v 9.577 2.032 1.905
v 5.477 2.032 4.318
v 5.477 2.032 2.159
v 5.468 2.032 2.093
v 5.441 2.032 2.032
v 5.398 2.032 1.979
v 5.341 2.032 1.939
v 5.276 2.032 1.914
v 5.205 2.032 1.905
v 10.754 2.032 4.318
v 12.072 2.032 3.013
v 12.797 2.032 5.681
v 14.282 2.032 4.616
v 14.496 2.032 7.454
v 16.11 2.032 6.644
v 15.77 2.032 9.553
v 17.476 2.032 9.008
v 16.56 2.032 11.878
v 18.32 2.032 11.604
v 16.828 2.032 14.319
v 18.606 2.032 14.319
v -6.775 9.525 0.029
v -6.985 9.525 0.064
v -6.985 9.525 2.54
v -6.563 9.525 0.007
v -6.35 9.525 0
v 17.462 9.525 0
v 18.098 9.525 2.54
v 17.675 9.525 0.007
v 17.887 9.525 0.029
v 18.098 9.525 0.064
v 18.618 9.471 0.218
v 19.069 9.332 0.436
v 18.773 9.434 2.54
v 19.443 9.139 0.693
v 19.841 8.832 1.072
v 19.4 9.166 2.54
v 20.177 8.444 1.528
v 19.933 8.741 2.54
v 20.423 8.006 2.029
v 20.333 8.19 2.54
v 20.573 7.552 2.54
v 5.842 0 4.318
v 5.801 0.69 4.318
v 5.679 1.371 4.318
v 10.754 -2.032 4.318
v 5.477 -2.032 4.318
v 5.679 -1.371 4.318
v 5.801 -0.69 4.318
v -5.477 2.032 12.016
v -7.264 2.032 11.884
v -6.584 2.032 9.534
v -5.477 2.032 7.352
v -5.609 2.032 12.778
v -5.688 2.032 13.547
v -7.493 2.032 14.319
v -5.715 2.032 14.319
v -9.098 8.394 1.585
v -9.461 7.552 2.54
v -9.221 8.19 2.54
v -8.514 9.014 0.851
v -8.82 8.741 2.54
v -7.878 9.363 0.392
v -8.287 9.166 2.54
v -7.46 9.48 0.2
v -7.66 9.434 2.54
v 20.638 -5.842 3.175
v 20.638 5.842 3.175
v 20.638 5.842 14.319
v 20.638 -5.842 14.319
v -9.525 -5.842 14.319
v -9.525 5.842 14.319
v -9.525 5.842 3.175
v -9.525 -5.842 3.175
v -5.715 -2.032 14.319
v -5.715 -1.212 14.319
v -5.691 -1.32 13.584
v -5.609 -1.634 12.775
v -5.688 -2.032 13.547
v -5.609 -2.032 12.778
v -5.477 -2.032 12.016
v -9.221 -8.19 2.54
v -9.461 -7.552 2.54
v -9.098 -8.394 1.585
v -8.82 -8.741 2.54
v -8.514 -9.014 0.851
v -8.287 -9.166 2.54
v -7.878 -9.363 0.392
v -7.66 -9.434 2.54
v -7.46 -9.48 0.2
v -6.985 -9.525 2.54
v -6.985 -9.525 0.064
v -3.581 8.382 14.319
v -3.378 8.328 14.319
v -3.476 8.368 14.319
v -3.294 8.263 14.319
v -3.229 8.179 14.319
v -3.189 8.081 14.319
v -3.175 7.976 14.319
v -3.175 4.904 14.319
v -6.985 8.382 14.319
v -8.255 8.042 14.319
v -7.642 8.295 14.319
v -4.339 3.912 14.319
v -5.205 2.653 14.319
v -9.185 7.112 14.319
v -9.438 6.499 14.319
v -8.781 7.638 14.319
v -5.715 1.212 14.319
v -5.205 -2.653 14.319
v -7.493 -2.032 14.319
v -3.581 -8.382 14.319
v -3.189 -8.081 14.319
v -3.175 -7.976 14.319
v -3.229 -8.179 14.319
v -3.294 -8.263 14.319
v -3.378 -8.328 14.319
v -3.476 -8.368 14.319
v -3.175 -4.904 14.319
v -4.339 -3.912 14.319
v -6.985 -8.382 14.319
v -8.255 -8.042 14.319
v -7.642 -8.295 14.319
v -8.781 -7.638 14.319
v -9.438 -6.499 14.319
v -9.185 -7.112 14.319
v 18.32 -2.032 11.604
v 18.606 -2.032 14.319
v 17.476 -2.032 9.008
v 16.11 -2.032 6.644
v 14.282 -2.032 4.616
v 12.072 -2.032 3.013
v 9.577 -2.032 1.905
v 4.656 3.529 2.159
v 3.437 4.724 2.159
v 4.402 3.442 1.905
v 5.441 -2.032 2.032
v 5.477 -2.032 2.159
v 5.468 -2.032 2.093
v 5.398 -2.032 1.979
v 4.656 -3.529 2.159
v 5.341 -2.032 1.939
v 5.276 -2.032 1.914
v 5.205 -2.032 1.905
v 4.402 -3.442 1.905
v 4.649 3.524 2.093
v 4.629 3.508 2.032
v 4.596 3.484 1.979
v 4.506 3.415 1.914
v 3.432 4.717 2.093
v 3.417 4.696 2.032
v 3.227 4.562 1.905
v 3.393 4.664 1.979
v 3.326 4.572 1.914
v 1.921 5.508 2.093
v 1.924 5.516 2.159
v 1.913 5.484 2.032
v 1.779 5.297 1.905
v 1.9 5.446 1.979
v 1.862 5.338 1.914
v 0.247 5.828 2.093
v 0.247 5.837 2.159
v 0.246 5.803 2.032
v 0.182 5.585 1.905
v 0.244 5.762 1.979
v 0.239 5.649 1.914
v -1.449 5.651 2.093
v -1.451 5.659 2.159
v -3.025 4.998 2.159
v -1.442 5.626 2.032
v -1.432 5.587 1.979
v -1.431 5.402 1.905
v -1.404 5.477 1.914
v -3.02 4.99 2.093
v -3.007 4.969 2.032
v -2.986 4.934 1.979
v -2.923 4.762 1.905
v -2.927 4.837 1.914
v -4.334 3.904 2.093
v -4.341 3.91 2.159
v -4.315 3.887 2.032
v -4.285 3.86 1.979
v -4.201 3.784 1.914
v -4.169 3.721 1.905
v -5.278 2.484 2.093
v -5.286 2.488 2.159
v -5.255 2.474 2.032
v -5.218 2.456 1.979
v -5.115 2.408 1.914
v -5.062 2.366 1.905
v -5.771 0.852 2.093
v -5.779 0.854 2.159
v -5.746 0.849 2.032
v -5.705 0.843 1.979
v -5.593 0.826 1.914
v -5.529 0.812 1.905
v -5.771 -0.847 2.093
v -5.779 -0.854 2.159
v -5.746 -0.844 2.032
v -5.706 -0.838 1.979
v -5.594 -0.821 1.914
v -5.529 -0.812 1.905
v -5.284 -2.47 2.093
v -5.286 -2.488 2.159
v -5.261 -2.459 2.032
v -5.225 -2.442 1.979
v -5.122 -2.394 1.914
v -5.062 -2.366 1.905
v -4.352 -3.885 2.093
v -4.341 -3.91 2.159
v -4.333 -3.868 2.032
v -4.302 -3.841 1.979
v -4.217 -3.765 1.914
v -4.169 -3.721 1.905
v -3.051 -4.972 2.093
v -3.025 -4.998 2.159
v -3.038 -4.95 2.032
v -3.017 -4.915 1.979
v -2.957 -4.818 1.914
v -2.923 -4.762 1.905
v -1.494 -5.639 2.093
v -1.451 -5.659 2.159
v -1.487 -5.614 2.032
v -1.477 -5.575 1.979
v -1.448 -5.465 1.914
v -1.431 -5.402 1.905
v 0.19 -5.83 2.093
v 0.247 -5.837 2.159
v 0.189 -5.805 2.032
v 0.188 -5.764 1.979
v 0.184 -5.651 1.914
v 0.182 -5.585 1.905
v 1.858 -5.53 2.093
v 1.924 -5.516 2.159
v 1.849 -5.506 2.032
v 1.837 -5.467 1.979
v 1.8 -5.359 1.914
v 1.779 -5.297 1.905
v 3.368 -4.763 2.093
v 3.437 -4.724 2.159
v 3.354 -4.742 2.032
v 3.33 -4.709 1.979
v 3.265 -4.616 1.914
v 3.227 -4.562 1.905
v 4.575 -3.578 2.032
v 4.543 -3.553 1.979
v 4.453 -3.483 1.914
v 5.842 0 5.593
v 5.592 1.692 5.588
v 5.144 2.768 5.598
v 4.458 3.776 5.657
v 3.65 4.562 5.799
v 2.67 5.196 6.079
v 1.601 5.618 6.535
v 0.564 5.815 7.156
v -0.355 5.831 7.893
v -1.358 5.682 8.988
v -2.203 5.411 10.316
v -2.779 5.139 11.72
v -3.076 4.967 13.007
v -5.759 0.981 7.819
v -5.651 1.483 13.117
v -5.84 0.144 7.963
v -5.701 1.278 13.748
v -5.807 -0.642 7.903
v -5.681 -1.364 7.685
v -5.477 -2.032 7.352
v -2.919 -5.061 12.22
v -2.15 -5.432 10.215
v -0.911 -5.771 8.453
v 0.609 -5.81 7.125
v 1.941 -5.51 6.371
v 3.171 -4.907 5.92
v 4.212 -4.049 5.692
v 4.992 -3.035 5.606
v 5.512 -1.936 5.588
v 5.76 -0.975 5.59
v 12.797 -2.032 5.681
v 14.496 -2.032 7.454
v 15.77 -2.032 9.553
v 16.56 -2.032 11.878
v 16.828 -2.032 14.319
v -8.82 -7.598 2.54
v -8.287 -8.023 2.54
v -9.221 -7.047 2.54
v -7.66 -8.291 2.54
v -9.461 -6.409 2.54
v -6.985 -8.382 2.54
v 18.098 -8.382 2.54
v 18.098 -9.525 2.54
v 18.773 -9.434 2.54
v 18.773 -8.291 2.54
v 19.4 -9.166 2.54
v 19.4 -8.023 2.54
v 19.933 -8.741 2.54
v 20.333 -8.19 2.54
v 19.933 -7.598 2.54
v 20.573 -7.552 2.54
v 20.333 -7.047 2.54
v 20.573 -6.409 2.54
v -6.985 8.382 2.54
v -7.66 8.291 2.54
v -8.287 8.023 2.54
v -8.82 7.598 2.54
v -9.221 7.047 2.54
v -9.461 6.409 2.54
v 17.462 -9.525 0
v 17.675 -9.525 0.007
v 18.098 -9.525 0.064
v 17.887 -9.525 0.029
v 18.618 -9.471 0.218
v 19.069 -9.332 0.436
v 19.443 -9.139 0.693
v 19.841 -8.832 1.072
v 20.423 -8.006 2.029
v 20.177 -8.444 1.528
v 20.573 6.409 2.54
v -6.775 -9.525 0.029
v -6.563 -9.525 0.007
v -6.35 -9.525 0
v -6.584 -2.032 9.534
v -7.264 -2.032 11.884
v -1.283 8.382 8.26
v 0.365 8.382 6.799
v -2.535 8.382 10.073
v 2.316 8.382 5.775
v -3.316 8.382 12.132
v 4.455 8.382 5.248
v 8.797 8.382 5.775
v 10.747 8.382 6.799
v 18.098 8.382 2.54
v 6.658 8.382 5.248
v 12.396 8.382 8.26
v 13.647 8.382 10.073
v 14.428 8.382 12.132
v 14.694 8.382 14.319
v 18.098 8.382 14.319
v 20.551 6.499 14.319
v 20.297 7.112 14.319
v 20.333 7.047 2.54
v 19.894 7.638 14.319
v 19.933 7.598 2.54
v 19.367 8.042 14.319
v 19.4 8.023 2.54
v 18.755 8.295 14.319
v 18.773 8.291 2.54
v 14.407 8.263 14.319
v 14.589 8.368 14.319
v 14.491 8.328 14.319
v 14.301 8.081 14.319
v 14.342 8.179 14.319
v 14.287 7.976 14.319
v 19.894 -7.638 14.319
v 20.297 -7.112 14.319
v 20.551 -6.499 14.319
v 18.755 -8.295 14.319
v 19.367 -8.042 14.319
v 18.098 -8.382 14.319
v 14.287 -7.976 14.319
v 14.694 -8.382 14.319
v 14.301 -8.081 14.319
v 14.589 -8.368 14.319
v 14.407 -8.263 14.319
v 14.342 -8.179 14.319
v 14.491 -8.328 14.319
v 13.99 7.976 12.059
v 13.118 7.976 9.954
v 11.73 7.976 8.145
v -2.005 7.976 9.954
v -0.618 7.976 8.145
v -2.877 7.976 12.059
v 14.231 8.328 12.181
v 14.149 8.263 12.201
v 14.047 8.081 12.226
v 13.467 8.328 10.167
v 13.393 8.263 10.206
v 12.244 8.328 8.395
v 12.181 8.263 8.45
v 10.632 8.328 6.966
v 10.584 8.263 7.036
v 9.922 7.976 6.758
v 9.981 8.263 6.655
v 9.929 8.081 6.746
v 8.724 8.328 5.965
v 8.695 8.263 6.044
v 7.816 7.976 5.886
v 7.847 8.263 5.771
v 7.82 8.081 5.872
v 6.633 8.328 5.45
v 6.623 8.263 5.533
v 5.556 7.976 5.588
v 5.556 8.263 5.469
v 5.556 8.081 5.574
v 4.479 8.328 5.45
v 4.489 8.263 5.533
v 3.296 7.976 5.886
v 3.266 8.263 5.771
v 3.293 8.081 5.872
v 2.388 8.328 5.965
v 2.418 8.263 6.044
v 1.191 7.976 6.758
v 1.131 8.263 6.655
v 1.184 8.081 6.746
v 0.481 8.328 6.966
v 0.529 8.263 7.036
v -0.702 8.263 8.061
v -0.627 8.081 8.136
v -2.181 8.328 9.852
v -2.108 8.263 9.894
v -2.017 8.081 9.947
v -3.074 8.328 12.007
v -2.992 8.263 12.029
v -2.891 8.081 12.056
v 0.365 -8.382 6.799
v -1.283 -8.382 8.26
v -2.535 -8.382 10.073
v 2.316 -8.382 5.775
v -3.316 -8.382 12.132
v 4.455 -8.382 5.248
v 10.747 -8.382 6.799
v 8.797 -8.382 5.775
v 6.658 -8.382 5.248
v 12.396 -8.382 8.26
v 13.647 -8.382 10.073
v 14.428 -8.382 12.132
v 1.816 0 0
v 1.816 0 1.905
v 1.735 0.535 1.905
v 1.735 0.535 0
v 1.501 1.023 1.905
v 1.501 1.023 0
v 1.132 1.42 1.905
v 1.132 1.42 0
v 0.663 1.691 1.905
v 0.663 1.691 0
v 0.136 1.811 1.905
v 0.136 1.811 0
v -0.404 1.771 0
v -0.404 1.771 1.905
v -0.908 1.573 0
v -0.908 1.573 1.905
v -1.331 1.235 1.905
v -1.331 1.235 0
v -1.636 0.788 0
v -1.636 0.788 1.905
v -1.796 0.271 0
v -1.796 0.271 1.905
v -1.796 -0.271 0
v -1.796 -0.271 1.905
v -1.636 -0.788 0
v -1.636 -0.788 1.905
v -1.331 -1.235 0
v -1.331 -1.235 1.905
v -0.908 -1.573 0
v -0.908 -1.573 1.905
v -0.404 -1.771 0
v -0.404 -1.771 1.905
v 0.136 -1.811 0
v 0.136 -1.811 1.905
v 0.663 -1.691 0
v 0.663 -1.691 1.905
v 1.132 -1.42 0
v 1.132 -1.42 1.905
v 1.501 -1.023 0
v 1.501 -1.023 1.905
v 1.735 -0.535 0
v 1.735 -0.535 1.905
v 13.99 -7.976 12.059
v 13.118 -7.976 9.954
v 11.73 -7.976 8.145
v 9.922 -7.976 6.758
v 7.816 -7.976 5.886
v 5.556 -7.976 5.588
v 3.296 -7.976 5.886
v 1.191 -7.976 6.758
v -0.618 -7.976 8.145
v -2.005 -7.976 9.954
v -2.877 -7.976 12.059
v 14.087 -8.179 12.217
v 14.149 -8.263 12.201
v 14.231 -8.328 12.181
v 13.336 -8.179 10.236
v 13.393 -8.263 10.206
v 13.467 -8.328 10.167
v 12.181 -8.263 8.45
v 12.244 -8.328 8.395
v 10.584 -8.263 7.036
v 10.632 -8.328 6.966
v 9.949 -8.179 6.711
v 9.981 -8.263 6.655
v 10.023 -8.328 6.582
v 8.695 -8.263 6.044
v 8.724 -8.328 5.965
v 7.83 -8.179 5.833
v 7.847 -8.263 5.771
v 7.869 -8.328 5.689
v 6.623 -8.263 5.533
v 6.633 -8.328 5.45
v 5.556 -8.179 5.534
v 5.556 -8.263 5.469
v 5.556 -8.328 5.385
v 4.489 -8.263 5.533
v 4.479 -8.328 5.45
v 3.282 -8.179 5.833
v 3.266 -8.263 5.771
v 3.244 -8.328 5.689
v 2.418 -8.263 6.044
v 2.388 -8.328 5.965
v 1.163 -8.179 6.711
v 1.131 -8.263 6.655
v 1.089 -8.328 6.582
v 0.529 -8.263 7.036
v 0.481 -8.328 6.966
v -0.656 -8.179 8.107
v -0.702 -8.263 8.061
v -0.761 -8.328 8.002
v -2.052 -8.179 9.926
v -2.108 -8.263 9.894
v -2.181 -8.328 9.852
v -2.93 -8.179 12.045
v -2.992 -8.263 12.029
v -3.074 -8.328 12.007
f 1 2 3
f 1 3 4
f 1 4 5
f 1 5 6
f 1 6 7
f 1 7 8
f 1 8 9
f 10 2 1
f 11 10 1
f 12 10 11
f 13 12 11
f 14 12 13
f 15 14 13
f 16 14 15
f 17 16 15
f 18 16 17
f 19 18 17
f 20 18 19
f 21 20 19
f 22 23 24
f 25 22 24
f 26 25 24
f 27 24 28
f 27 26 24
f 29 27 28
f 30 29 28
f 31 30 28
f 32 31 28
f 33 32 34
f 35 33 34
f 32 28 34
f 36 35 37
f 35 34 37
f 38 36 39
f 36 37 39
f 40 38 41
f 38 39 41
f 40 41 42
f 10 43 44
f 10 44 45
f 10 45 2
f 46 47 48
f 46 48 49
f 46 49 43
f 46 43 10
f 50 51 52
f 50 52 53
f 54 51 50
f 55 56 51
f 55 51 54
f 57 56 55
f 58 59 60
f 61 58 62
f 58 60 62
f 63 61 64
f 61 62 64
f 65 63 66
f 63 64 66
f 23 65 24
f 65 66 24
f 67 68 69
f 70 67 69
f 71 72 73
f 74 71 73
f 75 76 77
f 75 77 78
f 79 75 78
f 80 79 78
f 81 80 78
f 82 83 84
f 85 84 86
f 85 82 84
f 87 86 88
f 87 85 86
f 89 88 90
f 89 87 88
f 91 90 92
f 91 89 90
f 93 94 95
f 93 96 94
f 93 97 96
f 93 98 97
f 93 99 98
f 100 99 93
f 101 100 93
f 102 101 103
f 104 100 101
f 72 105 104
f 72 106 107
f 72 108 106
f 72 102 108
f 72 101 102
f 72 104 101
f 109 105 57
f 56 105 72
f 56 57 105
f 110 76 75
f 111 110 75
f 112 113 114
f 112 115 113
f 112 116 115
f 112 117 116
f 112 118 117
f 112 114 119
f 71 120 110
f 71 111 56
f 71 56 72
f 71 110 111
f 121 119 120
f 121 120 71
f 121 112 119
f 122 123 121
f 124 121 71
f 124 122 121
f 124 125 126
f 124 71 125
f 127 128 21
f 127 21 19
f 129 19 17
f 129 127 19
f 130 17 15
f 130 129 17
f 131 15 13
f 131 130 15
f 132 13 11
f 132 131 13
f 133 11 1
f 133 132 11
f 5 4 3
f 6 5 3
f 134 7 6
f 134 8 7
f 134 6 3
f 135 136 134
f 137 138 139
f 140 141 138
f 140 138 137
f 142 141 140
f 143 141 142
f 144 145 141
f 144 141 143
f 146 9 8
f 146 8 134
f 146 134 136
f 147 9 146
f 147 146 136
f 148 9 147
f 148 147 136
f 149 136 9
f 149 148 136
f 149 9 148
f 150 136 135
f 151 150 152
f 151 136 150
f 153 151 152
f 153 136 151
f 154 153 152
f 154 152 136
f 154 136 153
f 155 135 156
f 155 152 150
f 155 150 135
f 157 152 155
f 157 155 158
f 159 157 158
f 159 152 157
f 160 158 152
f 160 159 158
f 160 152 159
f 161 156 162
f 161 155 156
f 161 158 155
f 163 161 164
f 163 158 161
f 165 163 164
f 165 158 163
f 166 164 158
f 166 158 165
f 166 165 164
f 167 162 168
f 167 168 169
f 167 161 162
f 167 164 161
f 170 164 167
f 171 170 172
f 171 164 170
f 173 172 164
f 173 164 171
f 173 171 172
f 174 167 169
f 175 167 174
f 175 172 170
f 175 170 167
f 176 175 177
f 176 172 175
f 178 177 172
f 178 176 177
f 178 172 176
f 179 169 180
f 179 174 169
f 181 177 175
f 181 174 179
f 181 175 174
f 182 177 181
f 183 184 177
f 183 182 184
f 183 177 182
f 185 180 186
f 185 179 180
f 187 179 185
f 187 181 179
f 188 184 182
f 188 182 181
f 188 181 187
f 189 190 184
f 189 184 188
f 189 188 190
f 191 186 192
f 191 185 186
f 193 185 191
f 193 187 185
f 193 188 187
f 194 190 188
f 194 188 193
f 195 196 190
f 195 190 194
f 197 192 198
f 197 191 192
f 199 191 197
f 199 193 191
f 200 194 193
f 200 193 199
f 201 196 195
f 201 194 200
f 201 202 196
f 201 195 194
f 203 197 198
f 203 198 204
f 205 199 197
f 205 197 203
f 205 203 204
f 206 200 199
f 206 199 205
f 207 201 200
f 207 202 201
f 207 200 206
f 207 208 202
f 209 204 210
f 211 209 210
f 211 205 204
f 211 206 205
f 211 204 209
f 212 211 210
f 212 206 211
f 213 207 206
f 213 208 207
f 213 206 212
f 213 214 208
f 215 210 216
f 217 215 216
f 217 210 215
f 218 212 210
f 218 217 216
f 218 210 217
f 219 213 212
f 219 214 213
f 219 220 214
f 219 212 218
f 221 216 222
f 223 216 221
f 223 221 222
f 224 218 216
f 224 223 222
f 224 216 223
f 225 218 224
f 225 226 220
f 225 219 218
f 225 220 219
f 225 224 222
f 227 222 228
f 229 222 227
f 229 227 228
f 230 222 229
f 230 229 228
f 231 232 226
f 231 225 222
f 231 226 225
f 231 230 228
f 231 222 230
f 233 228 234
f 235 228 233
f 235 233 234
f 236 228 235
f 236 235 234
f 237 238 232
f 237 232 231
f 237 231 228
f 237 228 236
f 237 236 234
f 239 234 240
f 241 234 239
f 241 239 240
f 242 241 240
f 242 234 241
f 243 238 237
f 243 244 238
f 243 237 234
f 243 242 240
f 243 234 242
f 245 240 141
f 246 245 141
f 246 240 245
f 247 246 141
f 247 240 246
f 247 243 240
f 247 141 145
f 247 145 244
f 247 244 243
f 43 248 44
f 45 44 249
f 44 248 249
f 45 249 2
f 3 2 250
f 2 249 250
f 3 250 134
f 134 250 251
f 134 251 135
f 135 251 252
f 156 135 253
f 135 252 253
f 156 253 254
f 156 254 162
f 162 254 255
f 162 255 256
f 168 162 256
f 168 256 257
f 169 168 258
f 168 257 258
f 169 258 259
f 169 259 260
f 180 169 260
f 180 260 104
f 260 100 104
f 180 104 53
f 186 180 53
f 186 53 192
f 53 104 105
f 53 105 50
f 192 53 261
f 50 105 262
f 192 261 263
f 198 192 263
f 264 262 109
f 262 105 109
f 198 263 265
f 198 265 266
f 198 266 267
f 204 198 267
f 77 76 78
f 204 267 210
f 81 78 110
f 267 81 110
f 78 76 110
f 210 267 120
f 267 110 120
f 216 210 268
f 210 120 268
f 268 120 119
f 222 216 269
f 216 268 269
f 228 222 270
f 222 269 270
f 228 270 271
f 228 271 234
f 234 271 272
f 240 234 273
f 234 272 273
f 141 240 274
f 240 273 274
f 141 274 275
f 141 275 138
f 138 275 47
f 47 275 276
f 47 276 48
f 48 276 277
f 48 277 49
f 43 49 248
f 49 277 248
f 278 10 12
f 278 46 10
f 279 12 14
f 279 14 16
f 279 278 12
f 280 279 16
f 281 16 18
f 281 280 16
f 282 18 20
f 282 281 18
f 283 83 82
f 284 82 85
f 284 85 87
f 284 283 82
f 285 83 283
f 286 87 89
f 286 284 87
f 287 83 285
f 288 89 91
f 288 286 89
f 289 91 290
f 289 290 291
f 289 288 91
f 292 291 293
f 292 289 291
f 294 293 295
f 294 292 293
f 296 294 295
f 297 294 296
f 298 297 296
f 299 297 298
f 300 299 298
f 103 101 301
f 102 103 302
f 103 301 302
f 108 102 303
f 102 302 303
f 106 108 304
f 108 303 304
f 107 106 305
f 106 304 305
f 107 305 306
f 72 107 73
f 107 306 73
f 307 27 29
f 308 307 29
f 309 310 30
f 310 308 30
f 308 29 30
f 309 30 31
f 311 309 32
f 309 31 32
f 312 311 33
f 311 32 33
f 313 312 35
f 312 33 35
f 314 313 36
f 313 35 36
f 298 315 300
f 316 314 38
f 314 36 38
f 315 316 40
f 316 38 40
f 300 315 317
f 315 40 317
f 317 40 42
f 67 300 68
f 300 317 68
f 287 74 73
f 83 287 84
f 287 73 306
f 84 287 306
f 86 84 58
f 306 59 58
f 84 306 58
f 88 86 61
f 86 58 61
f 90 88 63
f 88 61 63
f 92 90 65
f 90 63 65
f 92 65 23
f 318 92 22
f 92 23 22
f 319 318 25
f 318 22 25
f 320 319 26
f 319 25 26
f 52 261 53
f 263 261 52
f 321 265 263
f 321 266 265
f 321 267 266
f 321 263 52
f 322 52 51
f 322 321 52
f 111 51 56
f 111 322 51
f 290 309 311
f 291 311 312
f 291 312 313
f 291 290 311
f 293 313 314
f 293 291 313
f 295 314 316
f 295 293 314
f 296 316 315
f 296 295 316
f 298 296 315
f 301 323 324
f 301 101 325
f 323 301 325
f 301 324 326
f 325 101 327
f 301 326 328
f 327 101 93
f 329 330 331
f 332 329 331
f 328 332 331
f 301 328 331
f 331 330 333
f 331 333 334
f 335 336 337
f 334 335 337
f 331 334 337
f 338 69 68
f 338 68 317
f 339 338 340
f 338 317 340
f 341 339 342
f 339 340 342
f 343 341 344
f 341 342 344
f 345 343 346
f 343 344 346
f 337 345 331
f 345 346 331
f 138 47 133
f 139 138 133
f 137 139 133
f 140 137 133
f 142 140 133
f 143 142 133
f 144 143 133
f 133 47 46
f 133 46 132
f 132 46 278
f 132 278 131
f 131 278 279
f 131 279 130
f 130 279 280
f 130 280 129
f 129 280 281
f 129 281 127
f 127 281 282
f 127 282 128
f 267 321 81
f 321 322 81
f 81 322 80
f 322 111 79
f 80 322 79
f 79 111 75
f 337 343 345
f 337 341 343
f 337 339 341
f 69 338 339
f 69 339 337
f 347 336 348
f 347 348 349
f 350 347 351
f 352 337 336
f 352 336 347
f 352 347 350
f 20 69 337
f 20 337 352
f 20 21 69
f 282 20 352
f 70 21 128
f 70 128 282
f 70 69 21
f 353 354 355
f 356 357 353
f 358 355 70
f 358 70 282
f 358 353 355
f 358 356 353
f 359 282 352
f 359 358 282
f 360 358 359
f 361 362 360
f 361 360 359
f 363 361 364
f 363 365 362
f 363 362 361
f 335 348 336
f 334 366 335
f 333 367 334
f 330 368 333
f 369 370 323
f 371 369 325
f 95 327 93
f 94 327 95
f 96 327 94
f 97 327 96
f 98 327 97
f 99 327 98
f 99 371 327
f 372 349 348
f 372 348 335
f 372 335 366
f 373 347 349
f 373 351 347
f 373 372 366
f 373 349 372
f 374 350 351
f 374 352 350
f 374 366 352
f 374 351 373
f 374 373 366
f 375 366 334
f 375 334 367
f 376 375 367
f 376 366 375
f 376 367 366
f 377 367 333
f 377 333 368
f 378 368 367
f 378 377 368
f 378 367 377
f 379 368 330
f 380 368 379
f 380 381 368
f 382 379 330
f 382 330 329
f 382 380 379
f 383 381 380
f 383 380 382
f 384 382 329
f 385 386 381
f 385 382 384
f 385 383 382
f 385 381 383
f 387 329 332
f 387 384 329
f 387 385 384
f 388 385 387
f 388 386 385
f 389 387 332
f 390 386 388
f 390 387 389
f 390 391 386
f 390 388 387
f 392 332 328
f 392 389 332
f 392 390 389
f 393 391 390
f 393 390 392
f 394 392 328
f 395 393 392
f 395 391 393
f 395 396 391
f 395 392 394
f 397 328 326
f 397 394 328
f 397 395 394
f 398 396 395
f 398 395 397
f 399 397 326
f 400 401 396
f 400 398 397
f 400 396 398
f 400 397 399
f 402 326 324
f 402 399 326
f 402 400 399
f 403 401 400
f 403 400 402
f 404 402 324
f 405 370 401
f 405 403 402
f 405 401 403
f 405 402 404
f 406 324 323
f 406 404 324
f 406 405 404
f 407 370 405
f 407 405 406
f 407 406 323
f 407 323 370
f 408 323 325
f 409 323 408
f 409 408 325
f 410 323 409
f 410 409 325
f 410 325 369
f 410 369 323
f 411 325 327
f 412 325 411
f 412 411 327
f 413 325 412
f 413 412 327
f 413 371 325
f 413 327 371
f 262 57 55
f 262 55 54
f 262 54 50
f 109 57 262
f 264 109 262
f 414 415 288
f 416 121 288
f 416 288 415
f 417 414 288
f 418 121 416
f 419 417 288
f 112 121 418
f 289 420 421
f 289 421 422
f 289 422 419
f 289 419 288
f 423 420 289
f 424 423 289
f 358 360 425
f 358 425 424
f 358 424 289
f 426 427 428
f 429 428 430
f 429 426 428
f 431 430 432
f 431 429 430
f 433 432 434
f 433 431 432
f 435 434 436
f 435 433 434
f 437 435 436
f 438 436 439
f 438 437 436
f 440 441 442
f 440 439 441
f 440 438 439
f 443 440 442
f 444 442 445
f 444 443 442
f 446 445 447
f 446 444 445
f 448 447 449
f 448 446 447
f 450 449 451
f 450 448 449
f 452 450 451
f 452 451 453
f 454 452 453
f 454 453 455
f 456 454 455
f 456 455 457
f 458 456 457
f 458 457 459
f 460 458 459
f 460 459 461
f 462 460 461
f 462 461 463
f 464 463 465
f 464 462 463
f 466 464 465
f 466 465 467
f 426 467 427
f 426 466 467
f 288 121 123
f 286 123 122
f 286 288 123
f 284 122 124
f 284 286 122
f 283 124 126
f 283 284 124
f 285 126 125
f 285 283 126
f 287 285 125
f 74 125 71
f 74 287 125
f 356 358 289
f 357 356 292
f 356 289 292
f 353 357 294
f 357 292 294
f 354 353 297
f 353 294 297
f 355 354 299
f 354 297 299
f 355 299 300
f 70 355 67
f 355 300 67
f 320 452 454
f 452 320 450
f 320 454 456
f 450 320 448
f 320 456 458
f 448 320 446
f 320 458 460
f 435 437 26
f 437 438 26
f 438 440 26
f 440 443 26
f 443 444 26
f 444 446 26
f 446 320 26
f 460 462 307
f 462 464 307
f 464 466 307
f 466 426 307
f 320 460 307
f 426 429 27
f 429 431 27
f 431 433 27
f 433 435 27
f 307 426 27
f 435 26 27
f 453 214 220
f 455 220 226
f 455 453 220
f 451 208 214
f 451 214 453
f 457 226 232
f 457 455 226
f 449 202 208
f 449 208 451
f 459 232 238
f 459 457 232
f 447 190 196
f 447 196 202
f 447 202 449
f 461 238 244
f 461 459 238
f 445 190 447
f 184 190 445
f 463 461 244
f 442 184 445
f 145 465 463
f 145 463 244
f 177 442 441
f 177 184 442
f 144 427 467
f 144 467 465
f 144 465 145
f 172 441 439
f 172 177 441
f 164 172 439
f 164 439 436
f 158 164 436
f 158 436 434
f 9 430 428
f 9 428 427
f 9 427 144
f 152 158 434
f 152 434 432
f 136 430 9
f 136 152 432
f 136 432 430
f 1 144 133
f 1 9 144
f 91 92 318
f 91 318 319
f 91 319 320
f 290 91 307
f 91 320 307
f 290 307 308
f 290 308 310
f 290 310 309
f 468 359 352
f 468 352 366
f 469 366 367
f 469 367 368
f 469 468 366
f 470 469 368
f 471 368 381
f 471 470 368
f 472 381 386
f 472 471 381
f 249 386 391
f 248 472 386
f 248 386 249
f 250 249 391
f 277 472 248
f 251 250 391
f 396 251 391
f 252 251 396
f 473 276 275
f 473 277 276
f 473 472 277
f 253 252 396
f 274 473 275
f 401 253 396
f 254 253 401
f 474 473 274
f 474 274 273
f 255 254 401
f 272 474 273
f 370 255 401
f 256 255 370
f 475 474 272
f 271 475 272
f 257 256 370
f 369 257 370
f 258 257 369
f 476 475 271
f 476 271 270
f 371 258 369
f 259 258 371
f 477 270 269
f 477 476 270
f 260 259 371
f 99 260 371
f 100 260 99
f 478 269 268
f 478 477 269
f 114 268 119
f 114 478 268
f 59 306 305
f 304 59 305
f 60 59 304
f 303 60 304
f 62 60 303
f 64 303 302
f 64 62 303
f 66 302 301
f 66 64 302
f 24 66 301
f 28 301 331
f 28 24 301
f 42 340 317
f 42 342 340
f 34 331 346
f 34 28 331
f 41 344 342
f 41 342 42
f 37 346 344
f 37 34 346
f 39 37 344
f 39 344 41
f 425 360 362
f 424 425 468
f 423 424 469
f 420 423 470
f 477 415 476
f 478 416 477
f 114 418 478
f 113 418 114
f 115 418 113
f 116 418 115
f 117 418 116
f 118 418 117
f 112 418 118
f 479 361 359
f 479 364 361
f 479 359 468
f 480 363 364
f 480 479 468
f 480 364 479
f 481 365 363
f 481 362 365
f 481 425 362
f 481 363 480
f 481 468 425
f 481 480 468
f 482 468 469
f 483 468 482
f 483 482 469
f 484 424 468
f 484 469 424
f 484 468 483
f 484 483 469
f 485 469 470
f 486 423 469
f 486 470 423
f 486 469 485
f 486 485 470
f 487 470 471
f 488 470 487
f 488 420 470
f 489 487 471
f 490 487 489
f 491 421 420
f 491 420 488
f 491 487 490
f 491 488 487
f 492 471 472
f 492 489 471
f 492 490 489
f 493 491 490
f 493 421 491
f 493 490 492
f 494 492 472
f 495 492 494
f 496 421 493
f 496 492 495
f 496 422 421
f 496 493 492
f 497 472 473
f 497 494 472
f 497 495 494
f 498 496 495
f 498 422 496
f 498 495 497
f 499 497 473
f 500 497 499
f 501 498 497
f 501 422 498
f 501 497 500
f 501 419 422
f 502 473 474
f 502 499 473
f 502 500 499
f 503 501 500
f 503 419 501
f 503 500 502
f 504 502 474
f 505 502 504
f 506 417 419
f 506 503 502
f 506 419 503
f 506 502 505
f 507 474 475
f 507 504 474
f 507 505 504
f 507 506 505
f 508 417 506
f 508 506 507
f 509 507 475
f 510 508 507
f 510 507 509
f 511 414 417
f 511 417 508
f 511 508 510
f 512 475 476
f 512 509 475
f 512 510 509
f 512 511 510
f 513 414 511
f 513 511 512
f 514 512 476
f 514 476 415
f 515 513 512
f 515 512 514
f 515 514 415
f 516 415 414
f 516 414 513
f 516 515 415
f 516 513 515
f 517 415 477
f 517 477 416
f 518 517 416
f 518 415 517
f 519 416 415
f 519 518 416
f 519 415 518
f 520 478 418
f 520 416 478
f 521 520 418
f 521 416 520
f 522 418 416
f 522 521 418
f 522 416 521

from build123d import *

# Parameters (mm, degrees)
F2_W         = 30.1625
F2_H         = 19.05
F2_R         = 5.842
F2_R_2       = 1.8161
F3_DEPTH     = 2.54
F5_DEPTH     = 2.032
F7_DEPTH     = 6.35
F8_DEPTH     = 2.032
F9_DEPTH     = 2.032
F11_DEPTH    = 14.32025
F12_R        = 5.842
F13_DEPTH    = 12.41425
F14_R        = 2.54
F15_R        = 0.4064
F16_R        = 0.254
F17_T1_DEPTH = 18.2149387894
F18_T1_DEPTH = 29.845


# Not quite as in the source:
# - a fillet or chamfer that OpenCascade refuses, or shapes differently, is made with other operations: its cross-section is extruded or revolved along the edge and cut away or added


with BuildPart() as f3:
    # F2 (on Top) → F3 (new body)
    with BuildSketch(Plane.XY):
        with Locations((5.55625, 0)):
            Rectangle(F2_W, F2_H)
        Circle(F2_R, mode=Mode.SUBTRACT)
        Circle(F2_R)
        Circle(F2_R_2, mode=Mode.SUBTRACT)
    extrude(amount=F3_DEPTH)

    # F4 (on Front) → F5 (join, symmetric)
    with BuildSketch(Plane.XZ):
        with BuildLine():
            ThreePointArc((1.5351403895, 1.905), (-4.9973131459, 6.6442757011), (-7.493, 14.31925))
            Line((-7.493, 14.31925), (-9.525, 14.31925))
            Line((-9.525, 14.31925), (-9.525, 0))
            Line((-9.525, 0), (20.6375, 0))
            Line((20.6375, 0), (20.6375, 14.31925))
            Line((20.6375, 14.31925), (18.6055, 14.31925))
            ThreePointArc((18.6055, 14.31925), (16.1098131459, 6.6442757011), (9.5773596105, 1.905))
            Line((9.5773596105, 1.905), (1.5351403895, 1.905))
        make_face()
    extrude(amount=F5_DEPTH, both=True)

    # F6 (on face) → F7 (join)
    with BuildSketch(Plane.XZ.offset(2.032)):
        with BuildLine():
            Line((-3.175, 14.31925), (-9.525, 14.31925))
            Line((-9.525, 14.31925), (-9.525, 0))
            Line((-9.525, 0), (20.6375, 0))
            Line((20.6375, 0), (20.6375, 14.31925))
            Line((20.6375, 14.31925), (14.2875, 14.31925))
            ThreePointArc((14.2875, 14.31925), (5.55625, 5.588), (-3.175, 14.31925))
        make_face()
    extrude(amount=F7_DEPTH)

    # F4 (on Front) → F8 (cut, symmetric)
    with BuildSketch(Plane.XZ):
        with BuildLine():
            ThreePointArc((0.3585509899, 4.318), (-4.0776910817, 8.4687580722), (-5.715, 14.31925))
            Line((-5.715, 14.31925), (-7.493, 14.31925))
            ThreePointArc((-7.493, 14.31925), (-4.9973131459, 6.6442757011), (1.5351403895, 1.905))
            Line((1.5351403895, 1.905), (9.5773596105, 1.905))
            ThreePointArc((9.5773596105, 1.905), (16.1098131459, 6.6442757011), (18.6055, 14.31925))
            Line((18.6055, 14.31925), (16.8275, 14.31925))
            ThreePointArc((16.8275, 14.31925), (15.1901910817, 8.4687580722), (10.7539490101, 4.318))
            Line((10.7539490101, 4.318), (0.3585509899, 4.318))
        make_face()
    extrude(amount=F8_DEPTH, both=True, mode=Mode.SUBTRACT)

    # F4 (on Front) → F9 (join, through all)
    with BuildSketch(Plane.XZ):
        with BuildLine():
            ThreePointArc((14.2875, 14.31925), (5.55625, 5.588), (-3.175, 14.31925))
            Line((-3.175, 14.31925), (-5.715, 14.31925))
            ThreePointArc((-5.715, 14.31925), (-4.0776910817, 8.4687580722), (0.3585509899, 4.318))
            Line((0.3585509899, 4.318), (10.7539490101, 4.318))
            ThreePointArc((10.7539490101, 4.318), (15.1901910817, 8.4687580722), (16.8275, 14.31925))
            Line((16.8275, 14.31925), (14.2875, 14.31925))
        make_face()
    extrude(amount=F9_DEPTH)

    # F10: F3 across plane


with BuildPart() as f3_1:
    add(f3.part)
    add(f3.part.mirror(Plane.XZ))

    # F2 (on Top) → F11 (cut, through all)
    with BuildSketch(Plane.XY):
        Circle(F2_R_2)
    extrude(amount=F11_DEPTH, mode=Mode.SUBTRACT)

    # F12 (on face) → F13 (cut, through all)
    with BuildSketch(Plane.XY.offset(14.31925)):
        Circle(F12_R)
    extrude(amount=-F13_DEPTH, mode=Mode.SUBTRACT)

    # F14
    f14_edges = [f3_1.edges().sort_by_distance(p)[0] for p in [
        (20.6375, 9.525, 1.27),
        (-9.525, 9.525, 1.27),
        (20.6375, -9.525, 1.27),
        (-9.525, -9.525, 1.27),
    ]]
    fillet(f14_edges, radius=F14_R)

    # F15
    f15_edges = [f3_1.edges().sort_by_distance(p)[0] for p in [
        (5.55625, -8.382, 5.588),
        (5.55625, 8.382, 5.588),
    ]]
    fillet(f15_edges, radius=F15_R)

    # F16
    f16_edges = [f3_1.edges().sort_by_distance(p)[0] for p in [
        (-5.842, 0, 1.905),
    ]]
    fillet(f16_edges, radius=F16_R)

    # F17: fillet of radius 2.54 on 4 edges, made by hand

    # F17_s2 → F17_t1 (cut)
    with BuildSketch(Plane.XY.offset(2.54)):
        with BuildLine():
            ThreePointArc((-6.985, -8.382), (-8.7810512242, -7.6380512242), (-9.525, -5.842))
            Line((-9.525, -5.842), (-9.779, -5.842))
            ThreePointArc((-9.779, -5.842), (-9.779, -6.985), (-9.3184500445, -8.5217))
            Line((-9.3184500445, -8.5217), (-9.1063182222, -8.636))
            Line((-9.1063182222, -8.636), (-6.985, -8.636))
            Line((-6.985, -8.636), (-6.985, -8.382))
        make_face()
        with BuildLine():
            ThreePointArc((18.0975, -8.382), (19.8935512242, -7.6380512242), (20.6375, -5.842))
            Line((20.6375, -5.842), (20.8915, -5.842))
            ThreePointArc((20.8915, -5.842), (20.8915, -6.985), (20.4309500445, -8.5217))
            Line((20.4309500445, -8.5217), (20.2188182222, -8.636))
            Line((20.2188182222, -8.636), (18.0975, -8.636))
            Line((18.0975, -8.636), (18.0975, -8.382))
        make_face()
        with BuildLine():
            ThreePointArc((20.6375, 5.842), (19.8935512242, 7.6380512242), (18.0975, 8.382))
            Line((18.0975, 8.382), (18.0975, 8.636))
            Line((18.0975, 8.636), (20.2188182222, 8.636))
            Line((20.2188182222, 8.636), (20.4309500445, 8.5217))
            ThreePointArc((20.4309500445, 8.5217), (20.8915, 6.985), (20.8915, 5.842))
            Line((20.8915, 5.842), (20.6375, 5.842))
        make_face()
        with BuildLine():
            ThreePointArc((-6.985, 8.382), (-8.7810512242, 7.6380512242), (-9.525, 5.842))
            Line((-9.525, 5.842), (-9.779, 5.842))
            ThreePointArc((-9.779, 5.842), (-9.779, 6.985), (-9.3184500445, 8.5217))
            Line((-9.3184500445, 8.5217), (-9.1063182222, 8.636))
            Line((-9.1063182222, 8.636), (-6.985, 8.636))
            Line((-6.985, 8.636), (-6.985, 8.382))
        make_face()
    extrude(amount=F17_T1_DEPTH, mode=Mode.SUBTRACT)

    # F18: fillet of radius 3.175 on 2 edges, made by hand

    # F18_s2 → F18_t1 (cut)
    with BuildSketch(Plane.XZ.offset(-14.9225)):
        with BuildLine():
            ThreePointArc((17.4625, 0), (19.7075640303, 0.9299359697), (20.6375, 3.175))
            Line((20.6375, 3.175), (20.6375, 0))
            Line((20.6375, 0), (17.4625, 0))
        make_face()
        with BuildLine():
            ThreePointArc((-9.525, 3.175), (-8.5950640303, 0.9299359697), (-6.35, 0))
            Line((-6.35, 0), (-9.525, 0))
            Line((-9.525, 0), (-9.525, 3.175))
        make_face()
    extrude(amount=F18_T1_DEPTH, mode=Mode.SUBTRACT)


solid = f3_1.part
